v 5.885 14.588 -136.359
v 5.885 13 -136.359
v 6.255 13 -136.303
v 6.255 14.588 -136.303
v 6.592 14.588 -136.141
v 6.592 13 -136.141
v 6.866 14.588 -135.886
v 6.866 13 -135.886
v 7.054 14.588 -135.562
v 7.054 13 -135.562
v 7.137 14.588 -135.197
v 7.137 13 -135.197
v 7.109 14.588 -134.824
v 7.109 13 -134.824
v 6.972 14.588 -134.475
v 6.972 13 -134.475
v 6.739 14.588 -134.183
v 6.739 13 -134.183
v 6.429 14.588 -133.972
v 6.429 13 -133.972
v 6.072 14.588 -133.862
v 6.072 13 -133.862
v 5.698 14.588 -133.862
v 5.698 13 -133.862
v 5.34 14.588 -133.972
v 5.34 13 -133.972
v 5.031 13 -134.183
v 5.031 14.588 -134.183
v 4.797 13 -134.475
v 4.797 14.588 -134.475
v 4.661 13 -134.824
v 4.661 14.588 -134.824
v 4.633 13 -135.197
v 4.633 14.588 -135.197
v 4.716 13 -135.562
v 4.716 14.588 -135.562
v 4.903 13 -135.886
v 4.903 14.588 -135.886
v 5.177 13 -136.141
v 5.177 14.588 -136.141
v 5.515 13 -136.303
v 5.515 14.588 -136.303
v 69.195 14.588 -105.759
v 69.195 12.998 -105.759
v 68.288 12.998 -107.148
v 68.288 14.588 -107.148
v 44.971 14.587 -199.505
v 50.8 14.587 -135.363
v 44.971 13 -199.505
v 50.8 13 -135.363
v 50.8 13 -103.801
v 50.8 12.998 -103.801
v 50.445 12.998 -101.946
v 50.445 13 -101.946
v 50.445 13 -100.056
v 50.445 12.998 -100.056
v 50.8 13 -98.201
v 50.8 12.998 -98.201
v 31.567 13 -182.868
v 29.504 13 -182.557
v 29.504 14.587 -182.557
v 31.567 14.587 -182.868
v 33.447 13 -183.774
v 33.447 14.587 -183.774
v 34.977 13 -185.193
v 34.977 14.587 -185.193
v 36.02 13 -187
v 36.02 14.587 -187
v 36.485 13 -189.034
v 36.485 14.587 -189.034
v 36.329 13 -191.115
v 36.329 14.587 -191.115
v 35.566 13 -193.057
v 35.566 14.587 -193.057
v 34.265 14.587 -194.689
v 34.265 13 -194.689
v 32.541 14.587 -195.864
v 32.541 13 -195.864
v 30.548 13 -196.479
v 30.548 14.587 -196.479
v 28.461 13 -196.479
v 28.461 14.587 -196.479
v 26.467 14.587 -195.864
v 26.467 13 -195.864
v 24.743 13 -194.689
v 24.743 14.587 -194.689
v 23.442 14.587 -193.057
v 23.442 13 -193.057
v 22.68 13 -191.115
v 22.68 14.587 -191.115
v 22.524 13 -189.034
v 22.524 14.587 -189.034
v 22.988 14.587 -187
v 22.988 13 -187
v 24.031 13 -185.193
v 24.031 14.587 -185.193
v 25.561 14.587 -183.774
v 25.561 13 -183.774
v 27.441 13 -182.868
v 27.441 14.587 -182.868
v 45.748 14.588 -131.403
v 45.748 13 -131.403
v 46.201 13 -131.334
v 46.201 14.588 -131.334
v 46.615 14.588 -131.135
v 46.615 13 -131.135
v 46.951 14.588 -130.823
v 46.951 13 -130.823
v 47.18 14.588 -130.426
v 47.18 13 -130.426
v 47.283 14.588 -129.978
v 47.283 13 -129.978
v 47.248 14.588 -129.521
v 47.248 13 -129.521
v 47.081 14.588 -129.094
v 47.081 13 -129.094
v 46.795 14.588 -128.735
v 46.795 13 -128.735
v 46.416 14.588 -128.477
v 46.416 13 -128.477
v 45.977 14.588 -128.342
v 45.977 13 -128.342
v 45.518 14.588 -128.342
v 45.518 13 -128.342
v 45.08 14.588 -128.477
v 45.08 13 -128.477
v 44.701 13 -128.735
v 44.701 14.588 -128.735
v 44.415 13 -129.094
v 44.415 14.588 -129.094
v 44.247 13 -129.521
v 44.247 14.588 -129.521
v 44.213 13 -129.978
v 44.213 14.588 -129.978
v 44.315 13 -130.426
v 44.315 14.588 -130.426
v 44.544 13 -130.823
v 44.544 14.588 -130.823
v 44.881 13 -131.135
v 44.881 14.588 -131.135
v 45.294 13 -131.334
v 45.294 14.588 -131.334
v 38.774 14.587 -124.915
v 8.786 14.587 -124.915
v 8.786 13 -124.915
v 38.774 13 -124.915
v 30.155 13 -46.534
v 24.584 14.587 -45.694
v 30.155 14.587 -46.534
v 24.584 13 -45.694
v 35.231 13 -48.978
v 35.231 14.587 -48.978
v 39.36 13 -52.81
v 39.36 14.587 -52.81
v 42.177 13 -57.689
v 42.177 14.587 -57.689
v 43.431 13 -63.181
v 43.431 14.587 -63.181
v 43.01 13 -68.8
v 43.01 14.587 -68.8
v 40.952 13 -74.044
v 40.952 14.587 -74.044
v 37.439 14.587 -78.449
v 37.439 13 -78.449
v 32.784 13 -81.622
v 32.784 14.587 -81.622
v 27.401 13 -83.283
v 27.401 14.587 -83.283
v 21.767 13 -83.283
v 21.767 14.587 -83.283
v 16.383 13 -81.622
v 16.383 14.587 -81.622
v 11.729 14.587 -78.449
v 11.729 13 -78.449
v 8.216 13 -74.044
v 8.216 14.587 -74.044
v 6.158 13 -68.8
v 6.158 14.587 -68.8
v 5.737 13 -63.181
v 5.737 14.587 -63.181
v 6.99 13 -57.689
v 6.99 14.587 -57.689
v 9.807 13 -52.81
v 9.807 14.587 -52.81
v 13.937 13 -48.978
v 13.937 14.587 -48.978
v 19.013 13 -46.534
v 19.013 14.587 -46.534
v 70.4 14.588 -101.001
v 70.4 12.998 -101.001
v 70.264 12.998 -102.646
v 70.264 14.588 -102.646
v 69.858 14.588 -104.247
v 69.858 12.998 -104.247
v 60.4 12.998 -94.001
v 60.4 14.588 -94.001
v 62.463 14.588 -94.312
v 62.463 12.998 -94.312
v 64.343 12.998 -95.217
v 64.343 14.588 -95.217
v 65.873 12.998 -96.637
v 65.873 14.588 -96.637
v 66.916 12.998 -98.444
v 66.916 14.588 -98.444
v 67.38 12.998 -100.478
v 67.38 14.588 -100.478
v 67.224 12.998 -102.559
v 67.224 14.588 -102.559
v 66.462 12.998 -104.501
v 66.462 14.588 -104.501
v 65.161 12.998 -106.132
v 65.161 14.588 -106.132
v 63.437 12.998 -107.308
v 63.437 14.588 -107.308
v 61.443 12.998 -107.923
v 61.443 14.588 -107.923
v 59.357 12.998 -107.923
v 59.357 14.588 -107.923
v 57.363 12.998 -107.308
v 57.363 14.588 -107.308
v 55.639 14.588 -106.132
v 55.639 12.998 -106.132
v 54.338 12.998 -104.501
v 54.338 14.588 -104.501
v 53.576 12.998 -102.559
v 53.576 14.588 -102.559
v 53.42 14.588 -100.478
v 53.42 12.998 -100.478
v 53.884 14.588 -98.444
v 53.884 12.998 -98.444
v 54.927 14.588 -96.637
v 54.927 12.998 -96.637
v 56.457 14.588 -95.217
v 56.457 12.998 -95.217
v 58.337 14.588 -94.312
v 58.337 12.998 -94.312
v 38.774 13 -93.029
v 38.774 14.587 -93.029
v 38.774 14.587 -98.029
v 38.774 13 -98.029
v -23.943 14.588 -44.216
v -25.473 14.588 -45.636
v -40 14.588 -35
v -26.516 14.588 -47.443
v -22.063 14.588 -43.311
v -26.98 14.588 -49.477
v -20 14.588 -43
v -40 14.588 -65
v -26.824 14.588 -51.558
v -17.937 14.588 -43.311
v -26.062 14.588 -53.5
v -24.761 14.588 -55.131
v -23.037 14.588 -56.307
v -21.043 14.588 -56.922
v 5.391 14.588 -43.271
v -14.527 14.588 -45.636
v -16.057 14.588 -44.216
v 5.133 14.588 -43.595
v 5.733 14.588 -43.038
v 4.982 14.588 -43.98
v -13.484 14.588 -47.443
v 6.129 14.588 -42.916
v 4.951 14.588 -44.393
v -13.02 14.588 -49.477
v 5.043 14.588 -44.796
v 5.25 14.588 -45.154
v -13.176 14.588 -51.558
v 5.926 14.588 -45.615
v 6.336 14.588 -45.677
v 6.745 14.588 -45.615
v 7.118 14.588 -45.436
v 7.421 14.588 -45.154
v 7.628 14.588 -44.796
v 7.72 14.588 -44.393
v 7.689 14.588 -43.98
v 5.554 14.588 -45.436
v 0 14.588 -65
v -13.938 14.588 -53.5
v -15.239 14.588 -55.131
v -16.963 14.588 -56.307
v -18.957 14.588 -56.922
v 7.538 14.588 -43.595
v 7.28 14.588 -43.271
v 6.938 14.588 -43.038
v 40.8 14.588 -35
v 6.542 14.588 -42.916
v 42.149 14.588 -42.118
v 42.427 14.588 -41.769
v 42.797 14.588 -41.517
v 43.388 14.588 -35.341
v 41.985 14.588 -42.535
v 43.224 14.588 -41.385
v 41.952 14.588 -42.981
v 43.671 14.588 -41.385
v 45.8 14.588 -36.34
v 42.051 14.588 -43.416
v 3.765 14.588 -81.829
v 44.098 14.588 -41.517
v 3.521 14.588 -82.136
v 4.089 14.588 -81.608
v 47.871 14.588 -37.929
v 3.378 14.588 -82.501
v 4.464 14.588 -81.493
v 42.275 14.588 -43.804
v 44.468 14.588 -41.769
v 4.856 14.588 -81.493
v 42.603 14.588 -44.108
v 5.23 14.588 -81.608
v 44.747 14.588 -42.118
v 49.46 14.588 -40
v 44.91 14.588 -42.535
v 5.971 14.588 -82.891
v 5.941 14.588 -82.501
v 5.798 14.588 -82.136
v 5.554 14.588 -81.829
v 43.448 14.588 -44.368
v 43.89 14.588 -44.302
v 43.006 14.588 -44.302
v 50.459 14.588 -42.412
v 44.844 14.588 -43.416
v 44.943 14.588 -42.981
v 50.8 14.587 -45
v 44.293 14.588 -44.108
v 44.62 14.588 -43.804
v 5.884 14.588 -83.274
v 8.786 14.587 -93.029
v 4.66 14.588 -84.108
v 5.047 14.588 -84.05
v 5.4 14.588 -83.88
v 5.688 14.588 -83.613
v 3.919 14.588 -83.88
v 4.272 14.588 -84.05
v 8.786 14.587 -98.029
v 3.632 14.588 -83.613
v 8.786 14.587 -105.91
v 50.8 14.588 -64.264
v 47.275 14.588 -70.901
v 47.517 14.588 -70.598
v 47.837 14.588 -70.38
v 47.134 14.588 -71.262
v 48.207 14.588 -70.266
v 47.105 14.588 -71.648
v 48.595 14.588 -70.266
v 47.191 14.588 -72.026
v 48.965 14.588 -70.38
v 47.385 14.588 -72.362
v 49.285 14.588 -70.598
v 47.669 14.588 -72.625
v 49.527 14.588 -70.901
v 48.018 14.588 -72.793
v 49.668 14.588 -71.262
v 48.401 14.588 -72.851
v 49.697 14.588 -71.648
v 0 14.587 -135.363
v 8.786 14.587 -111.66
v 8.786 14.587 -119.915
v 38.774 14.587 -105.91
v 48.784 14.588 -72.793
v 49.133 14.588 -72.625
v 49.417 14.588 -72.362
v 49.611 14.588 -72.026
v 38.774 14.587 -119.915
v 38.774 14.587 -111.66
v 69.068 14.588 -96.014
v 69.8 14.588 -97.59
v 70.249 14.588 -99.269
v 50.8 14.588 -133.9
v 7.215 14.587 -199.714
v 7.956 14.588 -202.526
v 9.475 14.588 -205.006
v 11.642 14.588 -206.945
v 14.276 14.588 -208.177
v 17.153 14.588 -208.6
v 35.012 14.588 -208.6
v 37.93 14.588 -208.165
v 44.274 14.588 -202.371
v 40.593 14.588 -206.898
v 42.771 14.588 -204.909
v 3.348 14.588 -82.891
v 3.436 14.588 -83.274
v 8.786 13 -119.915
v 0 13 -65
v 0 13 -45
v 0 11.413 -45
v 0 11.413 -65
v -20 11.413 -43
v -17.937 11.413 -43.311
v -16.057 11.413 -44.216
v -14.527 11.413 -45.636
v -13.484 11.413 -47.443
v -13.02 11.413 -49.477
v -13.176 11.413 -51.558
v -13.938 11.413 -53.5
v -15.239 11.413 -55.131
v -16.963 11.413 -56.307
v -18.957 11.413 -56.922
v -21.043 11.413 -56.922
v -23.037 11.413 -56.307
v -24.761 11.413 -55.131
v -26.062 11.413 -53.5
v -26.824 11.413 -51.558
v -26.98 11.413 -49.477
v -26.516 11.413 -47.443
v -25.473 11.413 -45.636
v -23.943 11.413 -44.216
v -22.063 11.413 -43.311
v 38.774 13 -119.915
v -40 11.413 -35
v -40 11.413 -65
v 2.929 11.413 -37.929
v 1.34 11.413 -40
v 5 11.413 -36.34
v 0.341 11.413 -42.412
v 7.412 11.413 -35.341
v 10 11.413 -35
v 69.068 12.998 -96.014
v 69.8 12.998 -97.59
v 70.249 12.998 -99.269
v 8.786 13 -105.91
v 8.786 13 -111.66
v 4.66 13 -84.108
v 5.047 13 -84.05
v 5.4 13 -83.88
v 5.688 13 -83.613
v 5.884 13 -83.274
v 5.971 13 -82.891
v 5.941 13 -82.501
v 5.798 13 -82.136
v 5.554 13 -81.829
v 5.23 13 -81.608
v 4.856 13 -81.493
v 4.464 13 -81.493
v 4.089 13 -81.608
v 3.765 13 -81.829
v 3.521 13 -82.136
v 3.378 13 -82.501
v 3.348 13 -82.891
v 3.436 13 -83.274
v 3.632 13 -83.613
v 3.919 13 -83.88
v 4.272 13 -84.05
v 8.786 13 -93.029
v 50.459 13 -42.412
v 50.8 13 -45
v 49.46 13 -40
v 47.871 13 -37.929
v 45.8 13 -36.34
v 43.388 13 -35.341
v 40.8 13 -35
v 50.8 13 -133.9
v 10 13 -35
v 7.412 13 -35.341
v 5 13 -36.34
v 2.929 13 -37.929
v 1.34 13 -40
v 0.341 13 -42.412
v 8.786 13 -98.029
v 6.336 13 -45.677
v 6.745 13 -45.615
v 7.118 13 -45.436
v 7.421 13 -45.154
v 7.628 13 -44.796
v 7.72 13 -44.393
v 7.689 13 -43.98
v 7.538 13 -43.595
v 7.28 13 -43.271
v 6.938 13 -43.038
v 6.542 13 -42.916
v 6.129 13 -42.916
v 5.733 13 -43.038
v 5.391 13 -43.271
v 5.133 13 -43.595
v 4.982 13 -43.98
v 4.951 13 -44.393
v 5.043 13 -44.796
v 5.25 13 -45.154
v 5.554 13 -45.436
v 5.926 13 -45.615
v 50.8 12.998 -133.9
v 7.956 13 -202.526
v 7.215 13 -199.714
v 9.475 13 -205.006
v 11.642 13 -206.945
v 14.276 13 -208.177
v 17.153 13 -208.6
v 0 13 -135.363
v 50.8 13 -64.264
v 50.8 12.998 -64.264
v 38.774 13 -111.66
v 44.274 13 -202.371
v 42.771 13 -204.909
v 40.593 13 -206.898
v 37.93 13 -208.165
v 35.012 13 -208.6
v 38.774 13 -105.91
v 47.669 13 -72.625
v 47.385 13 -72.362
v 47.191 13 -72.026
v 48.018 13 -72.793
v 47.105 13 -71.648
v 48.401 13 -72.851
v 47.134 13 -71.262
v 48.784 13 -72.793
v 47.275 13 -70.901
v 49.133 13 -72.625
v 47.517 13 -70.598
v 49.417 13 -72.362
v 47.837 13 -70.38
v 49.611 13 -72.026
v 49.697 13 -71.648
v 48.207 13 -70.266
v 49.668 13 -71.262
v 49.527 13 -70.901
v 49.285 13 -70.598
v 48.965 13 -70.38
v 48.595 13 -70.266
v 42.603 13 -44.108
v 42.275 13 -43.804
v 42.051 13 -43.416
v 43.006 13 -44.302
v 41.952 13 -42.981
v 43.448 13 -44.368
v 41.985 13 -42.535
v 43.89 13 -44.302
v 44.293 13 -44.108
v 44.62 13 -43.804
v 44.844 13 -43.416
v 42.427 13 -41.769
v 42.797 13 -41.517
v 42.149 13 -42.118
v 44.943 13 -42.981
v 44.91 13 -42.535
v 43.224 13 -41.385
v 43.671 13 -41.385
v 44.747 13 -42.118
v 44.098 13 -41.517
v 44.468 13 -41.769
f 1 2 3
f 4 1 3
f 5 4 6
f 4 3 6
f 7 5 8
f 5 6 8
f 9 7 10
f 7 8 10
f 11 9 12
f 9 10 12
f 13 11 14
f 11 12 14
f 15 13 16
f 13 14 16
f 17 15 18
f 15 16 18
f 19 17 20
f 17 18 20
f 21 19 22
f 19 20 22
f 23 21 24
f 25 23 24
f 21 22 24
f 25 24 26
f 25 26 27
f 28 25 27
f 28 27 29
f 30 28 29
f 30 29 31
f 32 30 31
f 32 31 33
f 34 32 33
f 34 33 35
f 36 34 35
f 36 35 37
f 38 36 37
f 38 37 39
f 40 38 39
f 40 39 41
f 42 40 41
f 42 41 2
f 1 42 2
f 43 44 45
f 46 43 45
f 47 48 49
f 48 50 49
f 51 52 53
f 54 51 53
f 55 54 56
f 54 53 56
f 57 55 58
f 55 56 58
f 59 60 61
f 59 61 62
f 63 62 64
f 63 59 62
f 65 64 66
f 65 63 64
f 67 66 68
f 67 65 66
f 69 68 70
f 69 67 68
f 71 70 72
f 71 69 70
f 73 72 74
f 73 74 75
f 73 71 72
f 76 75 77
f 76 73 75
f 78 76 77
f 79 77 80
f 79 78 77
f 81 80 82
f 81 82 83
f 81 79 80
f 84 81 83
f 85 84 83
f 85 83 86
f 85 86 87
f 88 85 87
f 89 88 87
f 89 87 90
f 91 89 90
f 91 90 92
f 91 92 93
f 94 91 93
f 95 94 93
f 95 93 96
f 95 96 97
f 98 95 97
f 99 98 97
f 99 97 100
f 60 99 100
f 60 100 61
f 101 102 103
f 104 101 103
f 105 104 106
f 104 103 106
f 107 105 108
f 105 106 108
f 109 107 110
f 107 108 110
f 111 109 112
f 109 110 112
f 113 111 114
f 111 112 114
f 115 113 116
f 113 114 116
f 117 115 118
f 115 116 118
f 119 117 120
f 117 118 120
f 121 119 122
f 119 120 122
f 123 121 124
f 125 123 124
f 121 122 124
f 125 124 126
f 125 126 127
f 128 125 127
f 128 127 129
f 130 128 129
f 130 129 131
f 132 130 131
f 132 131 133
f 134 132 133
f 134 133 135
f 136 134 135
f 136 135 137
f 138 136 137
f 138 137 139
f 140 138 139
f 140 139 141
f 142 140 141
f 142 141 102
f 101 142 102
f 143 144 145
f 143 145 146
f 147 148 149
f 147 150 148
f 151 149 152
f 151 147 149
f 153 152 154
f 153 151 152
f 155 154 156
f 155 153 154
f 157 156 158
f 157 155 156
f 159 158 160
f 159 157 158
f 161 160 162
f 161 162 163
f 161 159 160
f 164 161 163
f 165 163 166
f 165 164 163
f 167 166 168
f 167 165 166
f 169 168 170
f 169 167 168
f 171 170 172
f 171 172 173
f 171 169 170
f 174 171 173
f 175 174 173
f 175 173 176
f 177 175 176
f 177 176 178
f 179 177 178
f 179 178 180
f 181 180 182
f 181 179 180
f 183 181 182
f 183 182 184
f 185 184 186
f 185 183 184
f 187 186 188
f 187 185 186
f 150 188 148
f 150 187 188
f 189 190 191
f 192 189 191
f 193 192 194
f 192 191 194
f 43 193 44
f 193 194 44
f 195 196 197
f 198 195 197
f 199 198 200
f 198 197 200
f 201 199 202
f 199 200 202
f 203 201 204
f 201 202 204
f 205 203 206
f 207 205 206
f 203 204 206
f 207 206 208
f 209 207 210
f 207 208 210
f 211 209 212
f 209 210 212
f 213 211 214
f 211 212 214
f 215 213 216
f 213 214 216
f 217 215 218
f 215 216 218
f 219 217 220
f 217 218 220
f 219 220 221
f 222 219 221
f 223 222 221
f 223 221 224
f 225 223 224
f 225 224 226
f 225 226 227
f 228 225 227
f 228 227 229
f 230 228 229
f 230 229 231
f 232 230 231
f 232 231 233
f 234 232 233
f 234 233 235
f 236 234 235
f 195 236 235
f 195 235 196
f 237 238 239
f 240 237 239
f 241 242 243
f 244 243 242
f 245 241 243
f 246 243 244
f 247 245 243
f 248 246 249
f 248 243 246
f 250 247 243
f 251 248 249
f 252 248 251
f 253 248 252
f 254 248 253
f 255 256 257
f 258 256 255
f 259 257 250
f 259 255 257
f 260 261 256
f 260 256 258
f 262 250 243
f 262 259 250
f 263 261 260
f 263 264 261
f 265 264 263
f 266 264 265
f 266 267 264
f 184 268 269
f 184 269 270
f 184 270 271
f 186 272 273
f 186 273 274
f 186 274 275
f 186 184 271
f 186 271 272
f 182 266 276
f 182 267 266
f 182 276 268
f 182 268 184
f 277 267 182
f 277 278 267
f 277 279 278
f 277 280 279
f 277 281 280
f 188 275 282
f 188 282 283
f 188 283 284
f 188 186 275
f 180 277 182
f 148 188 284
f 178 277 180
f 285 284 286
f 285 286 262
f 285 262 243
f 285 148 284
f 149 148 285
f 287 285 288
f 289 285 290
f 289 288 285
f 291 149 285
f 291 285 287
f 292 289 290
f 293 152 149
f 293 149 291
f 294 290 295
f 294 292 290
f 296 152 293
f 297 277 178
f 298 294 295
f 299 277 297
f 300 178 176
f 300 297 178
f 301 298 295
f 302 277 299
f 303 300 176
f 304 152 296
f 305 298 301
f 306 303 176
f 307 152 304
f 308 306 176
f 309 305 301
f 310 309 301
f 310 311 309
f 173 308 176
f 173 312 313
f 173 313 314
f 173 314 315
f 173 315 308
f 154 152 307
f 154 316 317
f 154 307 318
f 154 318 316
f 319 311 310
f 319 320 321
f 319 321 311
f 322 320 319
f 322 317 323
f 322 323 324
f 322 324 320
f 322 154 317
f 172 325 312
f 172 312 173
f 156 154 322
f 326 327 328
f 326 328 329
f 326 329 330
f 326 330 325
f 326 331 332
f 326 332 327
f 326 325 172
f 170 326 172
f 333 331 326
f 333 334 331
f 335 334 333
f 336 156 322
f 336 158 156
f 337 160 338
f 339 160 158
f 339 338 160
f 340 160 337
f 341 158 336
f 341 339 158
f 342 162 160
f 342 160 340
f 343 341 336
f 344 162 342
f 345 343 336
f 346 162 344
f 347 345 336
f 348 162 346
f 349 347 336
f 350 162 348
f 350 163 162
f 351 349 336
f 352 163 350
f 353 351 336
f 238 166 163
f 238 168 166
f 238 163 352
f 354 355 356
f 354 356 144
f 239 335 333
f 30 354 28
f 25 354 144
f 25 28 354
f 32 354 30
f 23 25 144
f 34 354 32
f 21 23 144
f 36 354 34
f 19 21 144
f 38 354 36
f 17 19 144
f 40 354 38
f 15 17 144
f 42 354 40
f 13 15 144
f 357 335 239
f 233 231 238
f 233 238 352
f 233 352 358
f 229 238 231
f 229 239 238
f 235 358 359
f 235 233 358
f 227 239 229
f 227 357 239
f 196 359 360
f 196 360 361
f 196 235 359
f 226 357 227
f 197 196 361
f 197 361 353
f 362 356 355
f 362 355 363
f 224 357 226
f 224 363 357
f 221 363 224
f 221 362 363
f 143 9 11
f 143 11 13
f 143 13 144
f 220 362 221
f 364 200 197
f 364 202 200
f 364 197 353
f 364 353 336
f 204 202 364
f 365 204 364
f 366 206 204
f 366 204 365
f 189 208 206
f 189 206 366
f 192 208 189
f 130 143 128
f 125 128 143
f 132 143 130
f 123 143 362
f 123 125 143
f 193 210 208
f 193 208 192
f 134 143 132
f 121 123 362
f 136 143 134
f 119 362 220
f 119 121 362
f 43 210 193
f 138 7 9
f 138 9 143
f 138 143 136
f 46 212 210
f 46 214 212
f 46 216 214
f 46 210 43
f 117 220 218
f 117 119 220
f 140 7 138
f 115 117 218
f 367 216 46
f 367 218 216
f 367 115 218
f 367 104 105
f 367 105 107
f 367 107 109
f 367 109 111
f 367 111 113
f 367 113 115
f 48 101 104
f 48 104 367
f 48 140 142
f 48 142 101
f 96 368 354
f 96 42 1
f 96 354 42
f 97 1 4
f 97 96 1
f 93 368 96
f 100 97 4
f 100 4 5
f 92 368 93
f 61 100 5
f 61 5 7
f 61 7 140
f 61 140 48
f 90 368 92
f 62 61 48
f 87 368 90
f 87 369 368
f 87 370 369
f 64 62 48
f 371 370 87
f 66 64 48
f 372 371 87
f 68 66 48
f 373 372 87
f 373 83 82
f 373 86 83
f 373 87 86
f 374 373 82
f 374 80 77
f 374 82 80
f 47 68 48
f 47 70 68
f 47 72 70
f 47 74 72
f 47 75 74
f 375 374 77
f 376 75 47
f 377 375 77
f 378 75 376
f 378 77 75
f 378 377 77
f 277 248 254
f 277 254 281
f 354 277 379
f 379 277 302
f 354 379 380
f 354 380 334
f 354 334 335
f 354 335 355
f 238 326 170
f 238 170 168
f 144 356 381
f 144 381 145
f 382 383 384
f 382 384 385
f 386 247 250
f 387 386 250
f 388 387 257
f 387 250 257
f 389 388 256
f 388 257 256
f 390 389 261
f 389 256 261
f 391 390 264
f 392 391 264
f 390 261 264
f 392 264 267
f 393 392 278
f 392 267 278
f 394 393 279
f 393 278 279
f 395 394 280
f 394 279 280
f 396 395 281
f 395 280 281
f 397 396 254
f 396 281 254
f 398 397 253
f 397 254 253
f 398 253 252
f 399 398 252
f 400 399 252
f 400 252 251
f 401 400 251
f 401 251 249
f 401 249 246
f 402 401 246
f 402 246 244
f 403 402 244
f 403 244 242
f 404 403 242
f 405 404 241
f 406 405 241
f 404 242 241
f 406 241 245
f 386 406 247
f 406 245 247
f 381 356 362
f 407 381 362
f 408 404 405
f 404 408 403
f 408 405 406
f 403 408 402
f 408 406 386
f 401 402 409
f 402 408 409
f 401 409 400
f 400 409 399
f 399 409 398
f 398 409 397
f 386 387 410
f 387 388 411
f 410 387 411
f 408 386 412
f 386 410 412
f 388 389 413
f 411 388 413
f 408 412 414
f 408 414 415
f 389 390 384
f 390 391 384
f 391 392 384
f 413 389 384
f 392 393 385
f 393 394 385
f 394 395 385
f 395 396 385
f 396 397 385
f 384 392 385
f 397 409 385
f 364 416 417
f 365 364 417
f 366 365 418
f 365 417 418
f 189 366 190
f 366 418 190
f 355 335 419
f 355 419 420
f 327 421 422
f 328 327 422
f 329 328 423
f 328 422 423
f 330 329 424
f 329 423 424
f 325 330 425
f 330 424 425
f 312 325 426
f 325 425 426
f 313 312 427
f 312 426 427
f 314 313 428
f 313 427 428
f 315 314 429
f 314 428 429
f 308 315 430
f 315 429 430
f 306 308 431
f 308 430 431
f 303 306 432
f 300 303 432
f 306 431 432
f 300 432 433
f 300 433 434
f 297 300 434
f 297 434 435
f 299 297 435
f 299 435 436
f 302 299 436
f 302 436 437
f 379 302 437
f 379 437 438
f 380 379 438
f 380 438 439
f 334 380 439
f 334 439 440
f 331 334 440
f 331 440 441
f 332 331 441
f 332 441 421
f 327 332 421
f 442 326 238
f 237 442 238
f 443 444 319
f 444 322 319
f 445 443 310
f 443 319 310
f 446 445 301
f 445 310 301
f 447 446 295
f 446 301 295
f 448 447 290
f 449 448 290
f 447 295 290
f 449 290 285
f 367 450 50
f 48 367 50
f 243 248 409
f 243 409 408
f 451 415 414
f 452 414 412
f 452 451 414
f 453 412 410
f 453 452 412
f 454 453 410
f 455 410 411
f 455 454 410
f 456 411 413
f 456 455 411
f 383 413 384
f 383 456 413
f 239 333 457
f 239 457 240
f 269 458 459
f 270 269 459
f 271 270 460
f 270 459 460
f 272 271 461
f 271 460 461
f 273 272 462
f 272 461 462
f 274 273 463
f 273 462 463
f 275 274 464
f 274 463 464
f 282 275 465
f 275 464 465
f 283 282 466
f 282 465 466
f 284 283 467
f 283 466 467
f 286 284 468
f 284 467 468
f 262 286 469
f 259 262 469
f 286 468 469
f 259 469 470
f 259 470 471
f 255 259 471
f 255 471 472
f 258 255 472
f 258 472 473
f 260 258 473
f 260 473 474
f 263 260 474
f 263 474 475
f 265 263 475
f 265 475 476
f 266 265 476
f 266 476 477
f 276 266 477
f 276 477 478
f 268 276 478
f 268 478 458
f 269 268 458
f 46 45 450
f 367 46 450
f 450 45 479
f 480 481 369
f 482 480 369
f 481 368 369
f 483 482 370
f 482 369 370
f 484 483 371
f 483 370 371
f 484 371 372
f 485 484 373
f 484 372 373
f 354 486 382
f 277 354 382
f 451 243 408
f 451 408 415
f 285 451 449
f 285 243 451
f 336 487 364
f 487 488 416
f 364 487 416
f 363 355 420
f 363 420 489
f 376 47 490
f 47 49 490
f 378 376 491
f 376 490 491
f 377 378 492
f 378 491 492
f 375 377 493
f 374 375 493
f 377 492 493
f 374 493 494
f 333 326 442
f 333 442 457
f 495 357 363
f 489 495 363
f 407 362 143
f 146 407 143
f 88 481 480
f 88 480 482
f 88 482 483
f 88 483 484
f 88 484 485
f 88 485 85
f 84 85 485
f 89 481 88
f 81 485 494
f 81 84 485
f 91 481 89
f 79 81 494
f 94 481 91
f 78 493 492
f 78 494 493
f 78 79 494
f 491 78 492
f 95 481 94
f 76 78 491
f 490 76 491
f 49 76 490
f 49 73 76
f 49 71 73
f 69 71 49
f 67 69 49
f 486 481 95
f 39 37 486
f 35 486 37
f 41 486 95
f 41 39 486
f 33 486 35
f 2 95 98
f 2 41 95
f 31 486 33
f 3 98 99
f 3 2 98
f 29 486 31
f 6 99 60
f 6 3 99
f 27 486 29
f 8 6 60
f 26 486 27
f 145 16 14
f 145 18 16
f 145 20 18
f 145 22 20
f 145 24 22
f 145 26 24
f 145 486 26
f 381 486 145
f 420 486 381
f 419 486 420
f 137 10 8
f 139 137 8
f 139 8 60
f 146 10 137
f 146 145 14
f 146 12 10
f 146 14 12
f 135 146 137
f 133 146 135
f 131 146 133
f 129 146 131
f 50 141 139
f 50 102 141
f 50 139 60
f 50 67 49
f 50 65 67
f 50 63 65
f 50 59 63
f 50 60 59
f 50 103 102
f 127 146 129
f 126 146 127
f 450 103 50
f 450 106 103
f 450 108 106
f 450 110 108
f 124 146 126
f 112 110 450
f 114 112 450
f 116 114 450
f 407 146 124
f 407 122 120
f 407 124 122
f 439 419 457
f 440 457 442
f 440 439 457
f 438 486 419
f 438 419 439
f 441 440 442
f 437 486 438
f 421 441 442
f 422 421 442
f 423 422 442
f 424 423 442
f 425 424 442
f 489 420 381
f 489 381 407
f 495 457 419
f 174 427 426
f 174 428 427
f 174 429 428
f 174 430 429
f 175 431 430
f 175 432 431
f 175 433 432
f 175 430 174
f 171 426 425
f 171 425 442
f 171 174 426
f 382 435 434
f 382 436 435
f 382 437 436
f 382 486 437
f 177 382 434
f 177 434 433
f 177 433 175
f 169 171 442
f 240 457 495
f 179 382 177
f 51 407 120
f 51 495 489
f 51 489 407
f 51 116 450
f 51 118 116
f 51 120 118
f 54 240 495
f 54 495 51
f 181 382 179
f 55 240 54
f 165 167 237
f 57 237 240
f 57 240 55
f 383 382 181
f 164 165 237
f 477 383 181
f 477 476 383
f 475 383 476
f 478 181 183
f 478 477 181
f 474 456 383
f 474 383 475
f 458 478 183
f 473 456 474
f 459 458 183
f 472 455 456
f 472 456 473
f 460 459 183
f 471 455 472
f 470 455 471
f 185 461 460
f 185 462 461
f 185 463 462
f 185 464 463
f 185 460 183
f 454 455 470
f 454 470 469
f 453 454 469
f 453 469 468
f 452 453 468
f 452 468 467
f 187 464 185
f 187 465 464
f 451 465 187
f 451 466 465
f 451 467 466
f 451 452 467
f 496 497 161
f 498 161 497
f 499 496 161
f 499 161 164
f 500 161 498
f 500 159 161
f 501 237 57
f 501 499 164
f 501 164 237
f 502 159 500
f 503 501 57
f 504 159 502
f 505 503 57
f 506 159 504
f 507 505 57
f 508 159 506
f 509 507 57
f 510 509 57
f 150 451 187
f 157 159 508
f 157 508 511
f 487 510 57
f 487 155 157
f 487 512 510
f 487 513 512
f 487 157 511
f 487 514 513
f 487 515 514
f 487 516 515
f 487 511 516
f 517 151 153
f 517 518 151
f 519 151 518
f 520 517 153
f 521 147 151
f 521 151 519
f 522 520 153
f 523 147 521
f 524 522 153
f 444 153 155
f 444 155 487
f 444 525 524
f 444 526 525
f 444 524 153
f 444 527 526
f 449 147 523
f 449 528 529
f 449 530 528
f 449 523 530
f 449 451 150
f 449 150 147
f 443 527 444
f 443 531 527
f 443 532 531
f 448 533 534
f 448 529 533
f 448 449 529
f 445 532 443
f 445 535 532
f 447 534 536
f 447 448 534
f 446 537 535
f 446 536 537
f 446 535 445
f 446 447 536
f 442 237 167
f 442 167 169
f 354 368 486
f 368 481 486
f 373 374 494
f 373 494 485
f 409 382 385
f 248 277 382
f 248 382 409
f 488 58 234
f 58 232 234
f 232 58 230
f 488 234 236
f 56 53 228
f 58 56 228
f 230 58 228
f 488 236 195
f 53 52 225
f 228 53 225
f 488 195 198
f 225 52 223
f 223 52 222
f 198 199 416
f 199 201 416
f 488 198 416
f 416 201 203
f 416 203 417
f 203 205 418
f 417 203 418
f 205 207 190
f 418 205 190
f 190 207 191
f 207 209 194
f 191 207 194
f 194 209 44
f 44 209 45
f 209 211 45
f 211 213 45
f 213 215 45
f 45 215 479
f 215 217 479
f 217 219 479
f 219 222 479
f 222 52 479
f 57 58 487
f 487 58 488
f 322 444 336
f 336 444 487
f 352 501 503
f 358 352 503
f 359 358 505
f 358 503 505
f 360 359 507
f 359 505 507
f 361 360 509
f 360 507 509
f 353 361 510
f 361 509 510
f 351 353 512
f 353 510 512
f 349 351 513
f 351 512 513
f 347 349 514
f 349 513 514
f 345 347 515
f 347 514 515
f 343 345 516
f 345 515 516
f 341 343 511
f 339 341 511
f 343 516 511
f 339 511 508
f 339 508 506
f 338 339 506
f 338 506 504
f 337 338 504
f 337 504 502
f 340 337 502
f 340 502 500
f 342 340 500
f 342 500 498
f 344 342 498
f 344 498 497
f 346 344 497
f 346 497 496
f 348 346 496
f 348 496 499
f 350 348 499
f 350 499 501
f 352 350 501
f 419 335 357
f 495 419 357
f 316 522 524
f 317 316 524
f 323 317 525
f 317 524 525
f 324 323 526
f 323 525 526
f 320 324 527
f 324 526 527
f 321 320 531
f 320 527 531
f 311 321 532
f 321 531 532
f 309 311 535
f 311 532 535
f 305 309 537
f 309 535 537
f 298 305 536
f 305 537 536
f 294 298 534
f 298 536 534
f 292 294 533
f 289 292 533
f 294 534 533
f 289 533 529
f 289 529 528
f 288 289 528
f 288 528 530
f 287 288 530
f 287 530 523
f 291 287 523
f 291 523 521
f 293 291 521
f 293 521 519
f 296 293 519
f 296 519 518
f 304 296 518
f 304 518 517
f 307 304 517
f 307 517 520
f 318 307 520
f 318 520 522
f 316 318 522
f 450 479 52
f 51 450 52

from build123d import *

# Parameters (mm, degrees)
SKETCH1_R           = 2.875
SKETCH1_R_2         = 7
BOSS_EXTRUDE1_DEPTH = 24.5875
SKETCH4_W           = 66.272407177
SKETCH4_H           = 27.800260981
CUT_EXTRUDE2_DEPTH  = 20
FILLET3_R           = 10
FILLET4_R           = 10
BOSS_EXTRUDE3_START = -1.5875
BOSS_EXTRUDE3_DEPTH = 1.5875
SKETCH7_R           = 7
CUT_EXTRUDE3_DEPTH  = 1.5875
CUT_EXTRUDE4_START  = -10
SKETCH8_R           = 3
SKETCH8_R_2         = 18.9
SKETCH8_R_3         = 2.875
SKETCH8_R_4         = 7
CUT_EXTRUDE4_DEPTH  = 10
SKETCH9_W           = 229.1070397
SKETCH9_H           = 361.266964835
SKETCH9_R           = 1.388229101
SKETCH9_R_2         = 1.483383261
SKETCH9_R_3         = 1.314910669
SKETCH9_R_4         = 1.248623853
SKETCH9_R_5         = 1.255629307
SKETCH9_R_6         = 1.53911217
CUT_EXTRUDE5_DEPTH  = 13
SKETCH10_W          = 29.988446547
SKETCH10_H          = 5
SKETCH10_H_2        = 5.75
CUT_EXTRUDE6_DEPTH  = 22
SKETCH11_R          = 5.236653548
CUT_EXTRUDE7_DEPTH  = 10
BOSS_EXTRUDE4_START = -1.59
BOSS_EXTRUDE4_DEPTH = 1.59
SKETCH13_R          = 7
CUT_EXTRUDE8_DEPTH  = 41
SKETCH14_W          = 61.491848917
SKETCH14_H          = 35.587491391
CUT_EXTRUDE9_DEPTH  = 20
FILLET5_R           = 10
SKETCH16_W          = 163.723031551
SKETCH16_H          = 22.872070304
CUT_EXTRUDE11_DEPTH = 35
FILLET6_R           = 10
SKETCH17_R          = 1.53911217
SKETCH17_R_2        = 1.255629307
SKETCH17_R_3        = 1.3
SKETCH17_R_4        = 1.314910669
SKETCH17_R_5        = 1.388229101
SKETCH17_R_6        = 1.5
CUT_EXTRUDE12_DEPTH = 42
CUT_EXTRUDE13_START = -30
SKETCH18_R          = 18.9
CUT_EXTRUDE13_DEPTH = 30
SKETCH19_R          = 7
BOSS_EXTRUDE5_DEPTH = 3.175


with BuildPart() as part:
    # Sketch1 → Boss-Extrude1 (new body)
    with BuildSketch(Plane(origin=(0, 0, 0), x_dir=(1, 0, 0), z_dir=(0, 1, 0))):
        with BuildLine():
            Line((42.32729629, 228.6), (10.454309325, 228.6))
            Line((10.454309325, 228.6), (0, 135.362739137))
            Line((0, 135.362739137), (0, 0))
            Line((0, 0), (24.327009544, 0))
            Line((24.327009544, 0), (50.8, 0))
            Line((50.8, 0), (50.8, 64.87909603))
            Line((50.8, 64.87909603), (50.8, 87.423477361))
            Line((50.8, 87.423477361), (50.8, 98.200996728))
            ThreePointArc((50.8, 98.200996728), (50.4, 101.000996728), (50.8, 103.800996728))
            Line((50.8, 103.800996728), (50.8, 104.488200565))
            Line((50.8, 104.488200565), (50.8, 120.619222808))
            Line((50.8, 120.619222808), (50.8, 135.362739137))
            Line((50.8, 135.362739137), (42.32729629, 228.6))
        make_face()
        with Locations(Location((24.101759227, 108.78493524, 0), (0, 0, 270))):
            Circle(SKETCH1_R, mode=Mode.SUBTRACT)
        with Locations(Location((29.504213454, 189.557234372, 0), (0, 0, 270))):
            Circle(SKETCH1_R_2, mode=Mode.SUBTRACT)
    extrude(amount=BOSS_EXTRUDE1_DEPTH)

    # Sketch4 → Cut-Extrude2 (cut)
    with BuildSketch(Plane(origin=(0, 0, -228.6), x_dir=(-1, 0, 0), z_dir=(0, 0, -1))):
        with Locations((-28.174690156, -1.980940155)):
            Rectangle(SKETCH4_W, SKETCH4_H)
    extrude(amount=-CUT_EXTRUDE2_DEPTH, mode=Mode.SUBTRACT)

    # Fillet3
    fillet3_edges = [part.edges().sort_by_distance(p)[0] for p in [
        (44.144746445, 5.959595168, -208.6),
    ]]
    fillet(fillet3_edges, radius=FILLET3_R)

    # Fillet4
    fillet4_edges = [part.edges().sort_by_distance(p)[0] for p in [
        (50.8, 12.29375, 0),
        (0, 12.29375, 0),
        (8.211791854, 5.959595168, -208.6),
    ]]
    fillet(fillet4_edges, radius=FILLET4_R)

    # Sketch6 → Boss-Extrude3 (add)
    with BuildSketch(Plane(origin=(0, 24.5875, 0), x_dir=(1, 0, 0), z_dir=(0, 1, 0)).offset(BOSS_EXTRUDE3_START)):
        with BuildLine():
            Line((50.8, 135.362739137), (50.8, 103.800996728))
            ThreePointArc((50.8, 103.800996728), (50.4, 101.000996728), (50.8, 98.200996728))
            Line((50.8, 98.200996728), (50.8, 61.124243317))
            Line((50.8, 61.124243317), (69.258211507, 96.360728536))
            ThreePointArc((69.258211507, 96.360728536), (70.393157133, 101.370875786), (68.890940865, 106.283413148))
            Line((68.890940865, 106.283413148), (50.8, 135.362739137))
        make_face()
    extrude(amount=BOSS_EXTRUDE3_DEPTH)

    # Sketch7 → Cut-Extrude3 (cut)
    with BuildSketch(Plane(origin=(0, 24.5875, 0), x_dir=(1, 0, 0), z_dir=(0, 1, 0))):
        with Locations(Location((60.4, 101.000996728, 0), (0, 0, 270))):
            Circle(SKETCH7_R)
    extrude(amount=-CUT_EXTRUDE3_DEPTH, mode=Mode.SUBTRACT)

    # Sketch8 → Cut-Extrude4 (cut)
    with BuildSketch(Plane(origin=(0, 24.5875, 0), x_dir=(1, 0, 0), z_dir=(0, 1, 0)).offset(CUT_EXTRUDE4_START)):
        with BuildLine():
            Line((10.454309325, 228.6), (0, 135.362739137))
            Line((0, 135.362739137), (0, 10))
            ThreePointArc((0, 10), (2.928932188, 2.928932188), (10, 0))
            Line((10, 0), (40.8, 0))
            ThreePointArc((40.8, 0), (47.871067812, 2.928932188), (50.8, 10))
            Line((50.8, 10), (50.8, 61.124243317))
            Line((50.8, 61.124243317), (69.258211507, 96.360728536))
            ThreePointArc((69.258211507, 96.360728536), (70.393157133, 101.370875786), (68.890940865, 106.283413148))
            Line((68.890940865, 106.283413148), (50.8, 135.362739137))
            Line((50.8, 135.362739137), (42.32729629, 228.6))
            Line((42.32729629, 228.6), (10.454309325, 228.6))
        make_face()
        with Locations(Location((9.492033273, 118.909935242, 0), (0, 0, 270))):
            Circle(SKETCH8_R, mode=Mode.SUBTRACT)
        with Locations(Location((24.583834565, 64.593886665, 0), (0, 0, 270))):
            Circle(SKETCH8_R_2, mode=Mode.SUBTRACT)
        with Locations(Location((24.101759227, 108.78493524, 0), (0, 0, 270))):
            Circle(SKETCH8_R_3, mode=Mode.SUBTRACT)
        with Locations((60.4, 101.000996728)):
            Circle(SKETCH8_R_4, mode=Mode.SUBTRACT)
        with Locations(Location((29.504213454, 189.557234372, 0), (0, 0, 270))):
            Circle(SKETCH8_R_4, mode=Mode.SUBTRACT)
    extrude(amount=CUT_EXTRUDE4_DEPTH, mode=Mode.SUBTRACT)

    # Sketch9 → Cut-Extrude5 (cut)
    with BuildSketch(Plane.XZ):
        with Locations((19.903204009, -125.752229467)):
            Rectangle(SKETCH9_W, SKETCH9_H)
        with Locations(Location((6.335590122, -44.288799513, 0), (0, 0, 270))):
            Circle(SKETCH9_R, mode=Mode.SUBTRACT)
        with Locations(Location((43.447673368, -42.868436544, 0), (0, 0, 270))):
            Circle(SKETCH9_R_2, mode=Mode.SUBTRACT)
        with Locations(Location((4.659546827, -82.793173401, 0), (0, 0, 270))):
            Circle(SKETCH9_R_3, mode=Mode.SUBTRACT)
        with Locations(Location((48.400988852, -71.551011715, 0), (0, 0, 270))):
            Circle(SKETCH9_R_4, mode=Mode.SUBTRACT)
        with Locations(Location((5.88467603, -135.103145298, 0), (0, 0, 270))):
            Circle(SKETCH9_R_5, mode=Mode.SUBTRACT)
        with Locations(Location((45.747747887, -129.863467374, 0), (0, 0, 270))):
            Circle(SKETCH9_R_6, mode=Mode.SUBTRACT)
    extrude(amount=-CUT_EXTRUDE5_DEPTH, mode=Mode.SUBTRACT)

    # Sketch10 → Cut-Extrude6 (cut)
    with BuildSketch(Plane(origin=(0, 24.5875, 0), x_dir=(1, 0, 0), z_dir=(0, 1, 0))):
        with Locations((23.779803557, 122.41493524)):
            Rectangle(SKETCH10_W, SKETCH10_H)
        with Locations((23.779803557, 108.78493524)):
            Rectangle(SKETCH10_W, SKETCH10_H_2)
        with Locations((23.779803557, 95.528937895)):
            Rectangle(SKETCH10_W, SKETCH10_H)
    extrude(amount=-CUT_EXTRUDE6_DEPTH, mode=Mode.SUBTRACT)

    # Sketch11 → Cut-Extrude7 (cut)
    with BuildSketch(Plane(origin=(0, 24.5875, 0), x_dir=(1, 0, 0), z_dir=(0, 1, 0))):
        with Locations((8.535526315, 118.29502971)):
            Circle(SKETCH11_R)
    extrude(amount=-CUT_EXTRUDE7_DEPTH, mode=Mode.SUBTRACT)

    # Sketch12 → Boss-Extrude4 (add)
    with BuildSketch(Plane(origin=(0, 14.5875, 0), x_dir=(1, 0, 0), z_dir=(0, 1, 0)).offset(BOSS_EXTRUDE4_START)):
        with BuildLine():
            Line((68.287536191, 107.148091395), (50.8, 133.900488173))
            Line((50.8, 133.900488173), (50.8, 103.800996728))
            ThreePointArc((50.8, 103.800996728), (58.520134646, 110.822712782), (68.287536191, 107.148091395))
        make_face()
        with BuildLine():
            Line((69.19540964, 105.759228466), (68.287536191, 107.148091395))
            ThreePointArc((68.287536191, 107.148091395), (58.520134646, 110.822712782), (50.8, 103.800996728))
            ThreePointArc((50.8, 103.800996728), (50.4, 101.000996728), (50.8, 98.200996728))
            ThreePointArc((50.8, 98.200996728), (59.211240578, 91.07190558), (69.067690563, 96.013899345))
            ThreePointArc((69.067690563, 96.013899345), (70.061182785, 98.419999404), (70.4, 101.000996728))
            ThreePointArc((70.4, 101.000996728), (70.094175994, 103.455167016), (69.19540964, 105.759228466))
        make_face()
        with BuildLine():
            ThreePointArc((69.067690563, 96.013899345), (59.211240578, 91.07190558), (50.8, 98.200996728))
            Line((50.8, 98.200996728), (50.8, 64.264230765))
            Line((50.8, 64.264230765), (69.067690563, 96.013899345))
        make_face()
    extrude(amount=BOSS_EXTRUDE4_DEPTH)

    # Sketch13 → Cut-Extrude8 (cut)
    with BuildSketch(Plane(origin=(0, 14.5875, 0), x_dir=(1, 0, 0), z_dir=(0, 1, 0))):
        with Locations(Location((60.4, 101.000996728, 0), (0, 0, 270))):
            Circle(SKETCH13_R)
    extrude(amount=-CUT_EXTRUDE8_DEPTH, mode=Mode.SUBTRACT)

    # Sketch14 → Cut-Extrude9 (cut)
    with BuildSketch(Plane(origin=(0, 0, -228.6), x_dir=(-1, 0, 0), z_dir=(0, 0, -1))):
        with Locations((-33.296946078, 21.381494753)):
            Rectangle(SKETCH14_W, SKETCH14_H)
    extrude(amount=-CUT_EXTRUDE9_DEPTH, mode=Mode.SUBTRACT)

    # Fillet5
    fillet5_edges = [part.edges().sort_by_distance(p)[0] for p in [
        (44.144746445, 13.79375, -208.6),
        (8.211791854, 13.79375, -208.6),
    ]]
    fillet(fillet5_edges, radius=FILLET5_R)

    # Sketch16 → Cut-Extrude11 (cut)
    with BuildSketch(Plane.XY):
        with Locations((6.935844153, 9.456999915)):
            Rectangle(SKETCH16_W, SKETCH16_H)
    extrude(amount=-CUT_EXTRUDE11_DEPTH, mode=Mode.SUBTRACT)

    # Fillet6
    fillet6_edges = [part.edges().sort_by_distance(p)[0] for p in [
        (0, 13.79375, -35),
        (50.8, 13.79375, -35),
    ]]
    fillet(fillet6_edges, radius=FILLET6_R)

    # Sketch17 → Cut-Extrude12 (cut)
    with BuildSketch(Plane.XZ):
        with Locations(Location((45.747747887, -129.863467374, 0), (0, 0, 270))):
            Circle(SKETCH17_R)
        with Locations(Location((5.88467603, -135.103145298, 0), (0, 0, 270))):
            Circle(SKETCH17_R_2)
        with Locations(Location((48.400988852, -71.551011715, 0), (0, 0, 270))):
            Circle(SKETCH17_R_3)
        with Locations(Location((4.659546827, -82.793173401, 0), (0, 0, 270))):
            Circle(SKETCH17_R_4)
        with Locations(Location((6.335590122, -44.288799513, 0), (0, 0, 270))):
            Circle(SKETCH17_R_5)
        with Locations(Location((43.447673368, -42.868436544, 0), (0, 0, 270))):
            Circle(SKETCH17_R_6)
    extrude(amount=-CUT_EXTRUDE12_DEPTH, mode=Mode.SUBTRACT)

    # Sketch18 → Cut-Extrude13 (cut)
    with BuildSketch(Plane(origin=(0, 24.5875, 0), x_dir=(1, 0, 0), z_dir=(0, 1, 0)).offset(CUT_EXTRUDE13_START)):
        with Locations(Location((24.583834565, 64.593886665, 0), (0, 0, 270))):
            Circle(SKETCH18_R)
    extrude(amount=CUT_EXTRUDE13_DEPTH, mode=Mode.SUBTRACT)

    # Sketch19 → Boss-Extrude5 (add)
    # profile 1 of 2: a face of its own
    with BuildSketch(Plane(origin=(0, 14.5875, 0), x_dir=(1, 0, 0), z_dir=(0, 1, 0))):
        Polygon((0, 45), (0, 65), (-40, 65), (-40, 35), (0, 35), align=None)
        with Locations(Location((-20, 50, 0), (0, 0, 270))):
            Circle(SKETCH19_R, mode=Mode.SUBTRACT)
    # profile 2 of 2: a face of its own
    with BuildSketch(Plane(origin=(0, 14.5875, 0), x_dir=(1, 0, 0), z_dir=(0, 1, 0))):
        with BuildLine():
            ThreePointArc((10, 35), (2.928932188, 37.928932188), (0, 45))
            Line((0, 45), (0, 35))
            Line((0, 35), (10, 35))
        make_face()
    extrude(amount=-BOSS_EXTRUDE5_DEPTH)


solid = part.part
